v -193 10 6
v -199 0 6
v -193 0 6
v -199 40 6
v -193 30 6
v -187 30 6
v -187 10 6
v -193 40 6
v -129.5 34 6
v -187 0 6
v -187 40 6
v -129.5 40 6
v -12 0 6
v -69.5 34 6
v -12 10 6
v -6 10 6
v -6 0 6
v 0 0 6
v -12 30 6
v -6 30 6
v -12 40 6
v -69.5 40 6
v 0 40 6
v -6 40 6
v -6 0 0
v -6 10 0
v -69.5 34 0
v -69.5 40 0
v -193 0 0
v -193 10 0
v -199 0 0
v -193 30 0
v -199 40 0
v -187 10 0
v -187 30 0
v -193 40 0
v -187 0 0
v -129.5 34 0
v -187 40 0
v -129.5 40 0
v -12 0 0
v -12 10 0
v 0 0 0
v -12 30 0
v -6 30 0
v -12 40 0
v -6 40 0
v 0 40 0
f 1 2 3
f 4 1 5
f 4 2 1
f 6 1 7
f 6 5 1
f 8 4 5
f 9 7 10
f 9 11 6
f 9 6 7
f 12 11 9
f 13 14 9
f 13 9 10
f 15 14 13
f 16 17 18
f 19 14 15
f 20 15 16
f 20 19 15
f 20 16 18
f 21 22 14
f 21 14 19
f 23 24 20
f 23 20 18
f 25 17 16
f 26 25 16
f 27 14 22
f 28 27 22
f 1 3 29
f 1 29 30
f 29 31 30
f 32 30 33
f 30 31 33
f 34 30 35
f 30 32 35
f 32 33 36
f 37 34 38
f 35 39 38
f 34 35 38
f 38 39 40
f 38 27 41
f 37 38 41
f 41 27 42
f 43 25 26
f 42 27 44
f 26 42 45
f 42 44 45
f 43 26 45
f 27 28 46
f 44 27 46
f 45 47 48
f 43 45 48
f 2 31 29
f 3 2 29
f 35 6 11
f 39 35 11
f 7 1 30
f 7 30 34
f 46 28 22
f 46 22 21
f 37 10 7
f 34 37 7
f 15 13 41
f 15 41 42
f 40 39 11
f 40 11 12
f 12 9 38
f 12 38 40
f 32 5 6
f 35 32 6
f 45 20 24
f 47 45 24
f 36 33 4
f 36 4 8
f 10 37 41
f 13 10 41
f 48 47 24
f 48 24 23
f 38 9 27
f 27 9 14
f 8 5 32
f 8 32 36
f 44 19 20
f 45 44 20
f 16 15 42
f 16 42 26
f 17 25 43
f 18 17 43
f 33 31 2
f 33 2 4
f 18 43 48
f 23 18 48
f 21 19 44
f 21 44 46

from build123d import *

# Parameters (mm, degrees)
SKETCH1_W            = 199
SKETCH1_H            = 40
BOSS_EXTRUDE1_DEPTH  = 6
SKETCH2_W            = 6
SKETCH2_H            = 10
CUT_EXTRUDE1_DEPTH   = 204.068953806
LPATTERN1_COUNT      = 2
LPATTERN1_PITCH      = 181
LPATTERN1_COUNT_DIR2 = 2
LPATTERN1_PITCH_DIR2 = 30
SKETCH3_W            = 60
SKETCH3_H            = 6
CUT_EXTRUDE2_DEPTH   = 204.068953806


with BuildPart() as part:
    # Sketch1 → Boss-Extrude1 (new body)
    with BuildSketch(Plane.XY):
        with Locations((-99.5, 20)):
            Rectangle(SKETCH1_W, SKETCH1_H)
    extrude(amount=BOSS_EXTRUDE1_DEPTH)

    # Sketch2 → Cut-Extrude1 (cut, through all)
    with BuildSketch(Plane.XY.offset(6)):
        with Locations((-190, 35)):
            Rectangle(SKETCH2_W, SKETCH2_H)
    cut_extrude1 = extrude(amount=-CUT_EXTRUDE1_DEPTH, mode=Mode.SUBTRACT)

    # LPattern1: Cut-Extrude1 2 × 2
    with Locations(*[(i * LPATTERN1_PITCH, -j * LPATTERN1_PITCH_DIR2, 0) for i in range(LPATTERN1_COUNT) for j in range(LPATTERN1_COUNT_DIR2) if (i, j) != (0, 0)]):
        add(cut_extrude1, mode=Mode.SUBTRACT)

    # Sketch3 → Cut-Extrude2 (cut, through all)
    with BuildSketch(Plane.XY.offset(6)):
        with Locations((-99.5, 37)):
            Rectangle(SKETCH3_W, SKETCH3_H)
    extrude(amount=-CUT_EXTRUDE2_DEPTH, mode=Mode.SUBTRACT)


solid = part.part
